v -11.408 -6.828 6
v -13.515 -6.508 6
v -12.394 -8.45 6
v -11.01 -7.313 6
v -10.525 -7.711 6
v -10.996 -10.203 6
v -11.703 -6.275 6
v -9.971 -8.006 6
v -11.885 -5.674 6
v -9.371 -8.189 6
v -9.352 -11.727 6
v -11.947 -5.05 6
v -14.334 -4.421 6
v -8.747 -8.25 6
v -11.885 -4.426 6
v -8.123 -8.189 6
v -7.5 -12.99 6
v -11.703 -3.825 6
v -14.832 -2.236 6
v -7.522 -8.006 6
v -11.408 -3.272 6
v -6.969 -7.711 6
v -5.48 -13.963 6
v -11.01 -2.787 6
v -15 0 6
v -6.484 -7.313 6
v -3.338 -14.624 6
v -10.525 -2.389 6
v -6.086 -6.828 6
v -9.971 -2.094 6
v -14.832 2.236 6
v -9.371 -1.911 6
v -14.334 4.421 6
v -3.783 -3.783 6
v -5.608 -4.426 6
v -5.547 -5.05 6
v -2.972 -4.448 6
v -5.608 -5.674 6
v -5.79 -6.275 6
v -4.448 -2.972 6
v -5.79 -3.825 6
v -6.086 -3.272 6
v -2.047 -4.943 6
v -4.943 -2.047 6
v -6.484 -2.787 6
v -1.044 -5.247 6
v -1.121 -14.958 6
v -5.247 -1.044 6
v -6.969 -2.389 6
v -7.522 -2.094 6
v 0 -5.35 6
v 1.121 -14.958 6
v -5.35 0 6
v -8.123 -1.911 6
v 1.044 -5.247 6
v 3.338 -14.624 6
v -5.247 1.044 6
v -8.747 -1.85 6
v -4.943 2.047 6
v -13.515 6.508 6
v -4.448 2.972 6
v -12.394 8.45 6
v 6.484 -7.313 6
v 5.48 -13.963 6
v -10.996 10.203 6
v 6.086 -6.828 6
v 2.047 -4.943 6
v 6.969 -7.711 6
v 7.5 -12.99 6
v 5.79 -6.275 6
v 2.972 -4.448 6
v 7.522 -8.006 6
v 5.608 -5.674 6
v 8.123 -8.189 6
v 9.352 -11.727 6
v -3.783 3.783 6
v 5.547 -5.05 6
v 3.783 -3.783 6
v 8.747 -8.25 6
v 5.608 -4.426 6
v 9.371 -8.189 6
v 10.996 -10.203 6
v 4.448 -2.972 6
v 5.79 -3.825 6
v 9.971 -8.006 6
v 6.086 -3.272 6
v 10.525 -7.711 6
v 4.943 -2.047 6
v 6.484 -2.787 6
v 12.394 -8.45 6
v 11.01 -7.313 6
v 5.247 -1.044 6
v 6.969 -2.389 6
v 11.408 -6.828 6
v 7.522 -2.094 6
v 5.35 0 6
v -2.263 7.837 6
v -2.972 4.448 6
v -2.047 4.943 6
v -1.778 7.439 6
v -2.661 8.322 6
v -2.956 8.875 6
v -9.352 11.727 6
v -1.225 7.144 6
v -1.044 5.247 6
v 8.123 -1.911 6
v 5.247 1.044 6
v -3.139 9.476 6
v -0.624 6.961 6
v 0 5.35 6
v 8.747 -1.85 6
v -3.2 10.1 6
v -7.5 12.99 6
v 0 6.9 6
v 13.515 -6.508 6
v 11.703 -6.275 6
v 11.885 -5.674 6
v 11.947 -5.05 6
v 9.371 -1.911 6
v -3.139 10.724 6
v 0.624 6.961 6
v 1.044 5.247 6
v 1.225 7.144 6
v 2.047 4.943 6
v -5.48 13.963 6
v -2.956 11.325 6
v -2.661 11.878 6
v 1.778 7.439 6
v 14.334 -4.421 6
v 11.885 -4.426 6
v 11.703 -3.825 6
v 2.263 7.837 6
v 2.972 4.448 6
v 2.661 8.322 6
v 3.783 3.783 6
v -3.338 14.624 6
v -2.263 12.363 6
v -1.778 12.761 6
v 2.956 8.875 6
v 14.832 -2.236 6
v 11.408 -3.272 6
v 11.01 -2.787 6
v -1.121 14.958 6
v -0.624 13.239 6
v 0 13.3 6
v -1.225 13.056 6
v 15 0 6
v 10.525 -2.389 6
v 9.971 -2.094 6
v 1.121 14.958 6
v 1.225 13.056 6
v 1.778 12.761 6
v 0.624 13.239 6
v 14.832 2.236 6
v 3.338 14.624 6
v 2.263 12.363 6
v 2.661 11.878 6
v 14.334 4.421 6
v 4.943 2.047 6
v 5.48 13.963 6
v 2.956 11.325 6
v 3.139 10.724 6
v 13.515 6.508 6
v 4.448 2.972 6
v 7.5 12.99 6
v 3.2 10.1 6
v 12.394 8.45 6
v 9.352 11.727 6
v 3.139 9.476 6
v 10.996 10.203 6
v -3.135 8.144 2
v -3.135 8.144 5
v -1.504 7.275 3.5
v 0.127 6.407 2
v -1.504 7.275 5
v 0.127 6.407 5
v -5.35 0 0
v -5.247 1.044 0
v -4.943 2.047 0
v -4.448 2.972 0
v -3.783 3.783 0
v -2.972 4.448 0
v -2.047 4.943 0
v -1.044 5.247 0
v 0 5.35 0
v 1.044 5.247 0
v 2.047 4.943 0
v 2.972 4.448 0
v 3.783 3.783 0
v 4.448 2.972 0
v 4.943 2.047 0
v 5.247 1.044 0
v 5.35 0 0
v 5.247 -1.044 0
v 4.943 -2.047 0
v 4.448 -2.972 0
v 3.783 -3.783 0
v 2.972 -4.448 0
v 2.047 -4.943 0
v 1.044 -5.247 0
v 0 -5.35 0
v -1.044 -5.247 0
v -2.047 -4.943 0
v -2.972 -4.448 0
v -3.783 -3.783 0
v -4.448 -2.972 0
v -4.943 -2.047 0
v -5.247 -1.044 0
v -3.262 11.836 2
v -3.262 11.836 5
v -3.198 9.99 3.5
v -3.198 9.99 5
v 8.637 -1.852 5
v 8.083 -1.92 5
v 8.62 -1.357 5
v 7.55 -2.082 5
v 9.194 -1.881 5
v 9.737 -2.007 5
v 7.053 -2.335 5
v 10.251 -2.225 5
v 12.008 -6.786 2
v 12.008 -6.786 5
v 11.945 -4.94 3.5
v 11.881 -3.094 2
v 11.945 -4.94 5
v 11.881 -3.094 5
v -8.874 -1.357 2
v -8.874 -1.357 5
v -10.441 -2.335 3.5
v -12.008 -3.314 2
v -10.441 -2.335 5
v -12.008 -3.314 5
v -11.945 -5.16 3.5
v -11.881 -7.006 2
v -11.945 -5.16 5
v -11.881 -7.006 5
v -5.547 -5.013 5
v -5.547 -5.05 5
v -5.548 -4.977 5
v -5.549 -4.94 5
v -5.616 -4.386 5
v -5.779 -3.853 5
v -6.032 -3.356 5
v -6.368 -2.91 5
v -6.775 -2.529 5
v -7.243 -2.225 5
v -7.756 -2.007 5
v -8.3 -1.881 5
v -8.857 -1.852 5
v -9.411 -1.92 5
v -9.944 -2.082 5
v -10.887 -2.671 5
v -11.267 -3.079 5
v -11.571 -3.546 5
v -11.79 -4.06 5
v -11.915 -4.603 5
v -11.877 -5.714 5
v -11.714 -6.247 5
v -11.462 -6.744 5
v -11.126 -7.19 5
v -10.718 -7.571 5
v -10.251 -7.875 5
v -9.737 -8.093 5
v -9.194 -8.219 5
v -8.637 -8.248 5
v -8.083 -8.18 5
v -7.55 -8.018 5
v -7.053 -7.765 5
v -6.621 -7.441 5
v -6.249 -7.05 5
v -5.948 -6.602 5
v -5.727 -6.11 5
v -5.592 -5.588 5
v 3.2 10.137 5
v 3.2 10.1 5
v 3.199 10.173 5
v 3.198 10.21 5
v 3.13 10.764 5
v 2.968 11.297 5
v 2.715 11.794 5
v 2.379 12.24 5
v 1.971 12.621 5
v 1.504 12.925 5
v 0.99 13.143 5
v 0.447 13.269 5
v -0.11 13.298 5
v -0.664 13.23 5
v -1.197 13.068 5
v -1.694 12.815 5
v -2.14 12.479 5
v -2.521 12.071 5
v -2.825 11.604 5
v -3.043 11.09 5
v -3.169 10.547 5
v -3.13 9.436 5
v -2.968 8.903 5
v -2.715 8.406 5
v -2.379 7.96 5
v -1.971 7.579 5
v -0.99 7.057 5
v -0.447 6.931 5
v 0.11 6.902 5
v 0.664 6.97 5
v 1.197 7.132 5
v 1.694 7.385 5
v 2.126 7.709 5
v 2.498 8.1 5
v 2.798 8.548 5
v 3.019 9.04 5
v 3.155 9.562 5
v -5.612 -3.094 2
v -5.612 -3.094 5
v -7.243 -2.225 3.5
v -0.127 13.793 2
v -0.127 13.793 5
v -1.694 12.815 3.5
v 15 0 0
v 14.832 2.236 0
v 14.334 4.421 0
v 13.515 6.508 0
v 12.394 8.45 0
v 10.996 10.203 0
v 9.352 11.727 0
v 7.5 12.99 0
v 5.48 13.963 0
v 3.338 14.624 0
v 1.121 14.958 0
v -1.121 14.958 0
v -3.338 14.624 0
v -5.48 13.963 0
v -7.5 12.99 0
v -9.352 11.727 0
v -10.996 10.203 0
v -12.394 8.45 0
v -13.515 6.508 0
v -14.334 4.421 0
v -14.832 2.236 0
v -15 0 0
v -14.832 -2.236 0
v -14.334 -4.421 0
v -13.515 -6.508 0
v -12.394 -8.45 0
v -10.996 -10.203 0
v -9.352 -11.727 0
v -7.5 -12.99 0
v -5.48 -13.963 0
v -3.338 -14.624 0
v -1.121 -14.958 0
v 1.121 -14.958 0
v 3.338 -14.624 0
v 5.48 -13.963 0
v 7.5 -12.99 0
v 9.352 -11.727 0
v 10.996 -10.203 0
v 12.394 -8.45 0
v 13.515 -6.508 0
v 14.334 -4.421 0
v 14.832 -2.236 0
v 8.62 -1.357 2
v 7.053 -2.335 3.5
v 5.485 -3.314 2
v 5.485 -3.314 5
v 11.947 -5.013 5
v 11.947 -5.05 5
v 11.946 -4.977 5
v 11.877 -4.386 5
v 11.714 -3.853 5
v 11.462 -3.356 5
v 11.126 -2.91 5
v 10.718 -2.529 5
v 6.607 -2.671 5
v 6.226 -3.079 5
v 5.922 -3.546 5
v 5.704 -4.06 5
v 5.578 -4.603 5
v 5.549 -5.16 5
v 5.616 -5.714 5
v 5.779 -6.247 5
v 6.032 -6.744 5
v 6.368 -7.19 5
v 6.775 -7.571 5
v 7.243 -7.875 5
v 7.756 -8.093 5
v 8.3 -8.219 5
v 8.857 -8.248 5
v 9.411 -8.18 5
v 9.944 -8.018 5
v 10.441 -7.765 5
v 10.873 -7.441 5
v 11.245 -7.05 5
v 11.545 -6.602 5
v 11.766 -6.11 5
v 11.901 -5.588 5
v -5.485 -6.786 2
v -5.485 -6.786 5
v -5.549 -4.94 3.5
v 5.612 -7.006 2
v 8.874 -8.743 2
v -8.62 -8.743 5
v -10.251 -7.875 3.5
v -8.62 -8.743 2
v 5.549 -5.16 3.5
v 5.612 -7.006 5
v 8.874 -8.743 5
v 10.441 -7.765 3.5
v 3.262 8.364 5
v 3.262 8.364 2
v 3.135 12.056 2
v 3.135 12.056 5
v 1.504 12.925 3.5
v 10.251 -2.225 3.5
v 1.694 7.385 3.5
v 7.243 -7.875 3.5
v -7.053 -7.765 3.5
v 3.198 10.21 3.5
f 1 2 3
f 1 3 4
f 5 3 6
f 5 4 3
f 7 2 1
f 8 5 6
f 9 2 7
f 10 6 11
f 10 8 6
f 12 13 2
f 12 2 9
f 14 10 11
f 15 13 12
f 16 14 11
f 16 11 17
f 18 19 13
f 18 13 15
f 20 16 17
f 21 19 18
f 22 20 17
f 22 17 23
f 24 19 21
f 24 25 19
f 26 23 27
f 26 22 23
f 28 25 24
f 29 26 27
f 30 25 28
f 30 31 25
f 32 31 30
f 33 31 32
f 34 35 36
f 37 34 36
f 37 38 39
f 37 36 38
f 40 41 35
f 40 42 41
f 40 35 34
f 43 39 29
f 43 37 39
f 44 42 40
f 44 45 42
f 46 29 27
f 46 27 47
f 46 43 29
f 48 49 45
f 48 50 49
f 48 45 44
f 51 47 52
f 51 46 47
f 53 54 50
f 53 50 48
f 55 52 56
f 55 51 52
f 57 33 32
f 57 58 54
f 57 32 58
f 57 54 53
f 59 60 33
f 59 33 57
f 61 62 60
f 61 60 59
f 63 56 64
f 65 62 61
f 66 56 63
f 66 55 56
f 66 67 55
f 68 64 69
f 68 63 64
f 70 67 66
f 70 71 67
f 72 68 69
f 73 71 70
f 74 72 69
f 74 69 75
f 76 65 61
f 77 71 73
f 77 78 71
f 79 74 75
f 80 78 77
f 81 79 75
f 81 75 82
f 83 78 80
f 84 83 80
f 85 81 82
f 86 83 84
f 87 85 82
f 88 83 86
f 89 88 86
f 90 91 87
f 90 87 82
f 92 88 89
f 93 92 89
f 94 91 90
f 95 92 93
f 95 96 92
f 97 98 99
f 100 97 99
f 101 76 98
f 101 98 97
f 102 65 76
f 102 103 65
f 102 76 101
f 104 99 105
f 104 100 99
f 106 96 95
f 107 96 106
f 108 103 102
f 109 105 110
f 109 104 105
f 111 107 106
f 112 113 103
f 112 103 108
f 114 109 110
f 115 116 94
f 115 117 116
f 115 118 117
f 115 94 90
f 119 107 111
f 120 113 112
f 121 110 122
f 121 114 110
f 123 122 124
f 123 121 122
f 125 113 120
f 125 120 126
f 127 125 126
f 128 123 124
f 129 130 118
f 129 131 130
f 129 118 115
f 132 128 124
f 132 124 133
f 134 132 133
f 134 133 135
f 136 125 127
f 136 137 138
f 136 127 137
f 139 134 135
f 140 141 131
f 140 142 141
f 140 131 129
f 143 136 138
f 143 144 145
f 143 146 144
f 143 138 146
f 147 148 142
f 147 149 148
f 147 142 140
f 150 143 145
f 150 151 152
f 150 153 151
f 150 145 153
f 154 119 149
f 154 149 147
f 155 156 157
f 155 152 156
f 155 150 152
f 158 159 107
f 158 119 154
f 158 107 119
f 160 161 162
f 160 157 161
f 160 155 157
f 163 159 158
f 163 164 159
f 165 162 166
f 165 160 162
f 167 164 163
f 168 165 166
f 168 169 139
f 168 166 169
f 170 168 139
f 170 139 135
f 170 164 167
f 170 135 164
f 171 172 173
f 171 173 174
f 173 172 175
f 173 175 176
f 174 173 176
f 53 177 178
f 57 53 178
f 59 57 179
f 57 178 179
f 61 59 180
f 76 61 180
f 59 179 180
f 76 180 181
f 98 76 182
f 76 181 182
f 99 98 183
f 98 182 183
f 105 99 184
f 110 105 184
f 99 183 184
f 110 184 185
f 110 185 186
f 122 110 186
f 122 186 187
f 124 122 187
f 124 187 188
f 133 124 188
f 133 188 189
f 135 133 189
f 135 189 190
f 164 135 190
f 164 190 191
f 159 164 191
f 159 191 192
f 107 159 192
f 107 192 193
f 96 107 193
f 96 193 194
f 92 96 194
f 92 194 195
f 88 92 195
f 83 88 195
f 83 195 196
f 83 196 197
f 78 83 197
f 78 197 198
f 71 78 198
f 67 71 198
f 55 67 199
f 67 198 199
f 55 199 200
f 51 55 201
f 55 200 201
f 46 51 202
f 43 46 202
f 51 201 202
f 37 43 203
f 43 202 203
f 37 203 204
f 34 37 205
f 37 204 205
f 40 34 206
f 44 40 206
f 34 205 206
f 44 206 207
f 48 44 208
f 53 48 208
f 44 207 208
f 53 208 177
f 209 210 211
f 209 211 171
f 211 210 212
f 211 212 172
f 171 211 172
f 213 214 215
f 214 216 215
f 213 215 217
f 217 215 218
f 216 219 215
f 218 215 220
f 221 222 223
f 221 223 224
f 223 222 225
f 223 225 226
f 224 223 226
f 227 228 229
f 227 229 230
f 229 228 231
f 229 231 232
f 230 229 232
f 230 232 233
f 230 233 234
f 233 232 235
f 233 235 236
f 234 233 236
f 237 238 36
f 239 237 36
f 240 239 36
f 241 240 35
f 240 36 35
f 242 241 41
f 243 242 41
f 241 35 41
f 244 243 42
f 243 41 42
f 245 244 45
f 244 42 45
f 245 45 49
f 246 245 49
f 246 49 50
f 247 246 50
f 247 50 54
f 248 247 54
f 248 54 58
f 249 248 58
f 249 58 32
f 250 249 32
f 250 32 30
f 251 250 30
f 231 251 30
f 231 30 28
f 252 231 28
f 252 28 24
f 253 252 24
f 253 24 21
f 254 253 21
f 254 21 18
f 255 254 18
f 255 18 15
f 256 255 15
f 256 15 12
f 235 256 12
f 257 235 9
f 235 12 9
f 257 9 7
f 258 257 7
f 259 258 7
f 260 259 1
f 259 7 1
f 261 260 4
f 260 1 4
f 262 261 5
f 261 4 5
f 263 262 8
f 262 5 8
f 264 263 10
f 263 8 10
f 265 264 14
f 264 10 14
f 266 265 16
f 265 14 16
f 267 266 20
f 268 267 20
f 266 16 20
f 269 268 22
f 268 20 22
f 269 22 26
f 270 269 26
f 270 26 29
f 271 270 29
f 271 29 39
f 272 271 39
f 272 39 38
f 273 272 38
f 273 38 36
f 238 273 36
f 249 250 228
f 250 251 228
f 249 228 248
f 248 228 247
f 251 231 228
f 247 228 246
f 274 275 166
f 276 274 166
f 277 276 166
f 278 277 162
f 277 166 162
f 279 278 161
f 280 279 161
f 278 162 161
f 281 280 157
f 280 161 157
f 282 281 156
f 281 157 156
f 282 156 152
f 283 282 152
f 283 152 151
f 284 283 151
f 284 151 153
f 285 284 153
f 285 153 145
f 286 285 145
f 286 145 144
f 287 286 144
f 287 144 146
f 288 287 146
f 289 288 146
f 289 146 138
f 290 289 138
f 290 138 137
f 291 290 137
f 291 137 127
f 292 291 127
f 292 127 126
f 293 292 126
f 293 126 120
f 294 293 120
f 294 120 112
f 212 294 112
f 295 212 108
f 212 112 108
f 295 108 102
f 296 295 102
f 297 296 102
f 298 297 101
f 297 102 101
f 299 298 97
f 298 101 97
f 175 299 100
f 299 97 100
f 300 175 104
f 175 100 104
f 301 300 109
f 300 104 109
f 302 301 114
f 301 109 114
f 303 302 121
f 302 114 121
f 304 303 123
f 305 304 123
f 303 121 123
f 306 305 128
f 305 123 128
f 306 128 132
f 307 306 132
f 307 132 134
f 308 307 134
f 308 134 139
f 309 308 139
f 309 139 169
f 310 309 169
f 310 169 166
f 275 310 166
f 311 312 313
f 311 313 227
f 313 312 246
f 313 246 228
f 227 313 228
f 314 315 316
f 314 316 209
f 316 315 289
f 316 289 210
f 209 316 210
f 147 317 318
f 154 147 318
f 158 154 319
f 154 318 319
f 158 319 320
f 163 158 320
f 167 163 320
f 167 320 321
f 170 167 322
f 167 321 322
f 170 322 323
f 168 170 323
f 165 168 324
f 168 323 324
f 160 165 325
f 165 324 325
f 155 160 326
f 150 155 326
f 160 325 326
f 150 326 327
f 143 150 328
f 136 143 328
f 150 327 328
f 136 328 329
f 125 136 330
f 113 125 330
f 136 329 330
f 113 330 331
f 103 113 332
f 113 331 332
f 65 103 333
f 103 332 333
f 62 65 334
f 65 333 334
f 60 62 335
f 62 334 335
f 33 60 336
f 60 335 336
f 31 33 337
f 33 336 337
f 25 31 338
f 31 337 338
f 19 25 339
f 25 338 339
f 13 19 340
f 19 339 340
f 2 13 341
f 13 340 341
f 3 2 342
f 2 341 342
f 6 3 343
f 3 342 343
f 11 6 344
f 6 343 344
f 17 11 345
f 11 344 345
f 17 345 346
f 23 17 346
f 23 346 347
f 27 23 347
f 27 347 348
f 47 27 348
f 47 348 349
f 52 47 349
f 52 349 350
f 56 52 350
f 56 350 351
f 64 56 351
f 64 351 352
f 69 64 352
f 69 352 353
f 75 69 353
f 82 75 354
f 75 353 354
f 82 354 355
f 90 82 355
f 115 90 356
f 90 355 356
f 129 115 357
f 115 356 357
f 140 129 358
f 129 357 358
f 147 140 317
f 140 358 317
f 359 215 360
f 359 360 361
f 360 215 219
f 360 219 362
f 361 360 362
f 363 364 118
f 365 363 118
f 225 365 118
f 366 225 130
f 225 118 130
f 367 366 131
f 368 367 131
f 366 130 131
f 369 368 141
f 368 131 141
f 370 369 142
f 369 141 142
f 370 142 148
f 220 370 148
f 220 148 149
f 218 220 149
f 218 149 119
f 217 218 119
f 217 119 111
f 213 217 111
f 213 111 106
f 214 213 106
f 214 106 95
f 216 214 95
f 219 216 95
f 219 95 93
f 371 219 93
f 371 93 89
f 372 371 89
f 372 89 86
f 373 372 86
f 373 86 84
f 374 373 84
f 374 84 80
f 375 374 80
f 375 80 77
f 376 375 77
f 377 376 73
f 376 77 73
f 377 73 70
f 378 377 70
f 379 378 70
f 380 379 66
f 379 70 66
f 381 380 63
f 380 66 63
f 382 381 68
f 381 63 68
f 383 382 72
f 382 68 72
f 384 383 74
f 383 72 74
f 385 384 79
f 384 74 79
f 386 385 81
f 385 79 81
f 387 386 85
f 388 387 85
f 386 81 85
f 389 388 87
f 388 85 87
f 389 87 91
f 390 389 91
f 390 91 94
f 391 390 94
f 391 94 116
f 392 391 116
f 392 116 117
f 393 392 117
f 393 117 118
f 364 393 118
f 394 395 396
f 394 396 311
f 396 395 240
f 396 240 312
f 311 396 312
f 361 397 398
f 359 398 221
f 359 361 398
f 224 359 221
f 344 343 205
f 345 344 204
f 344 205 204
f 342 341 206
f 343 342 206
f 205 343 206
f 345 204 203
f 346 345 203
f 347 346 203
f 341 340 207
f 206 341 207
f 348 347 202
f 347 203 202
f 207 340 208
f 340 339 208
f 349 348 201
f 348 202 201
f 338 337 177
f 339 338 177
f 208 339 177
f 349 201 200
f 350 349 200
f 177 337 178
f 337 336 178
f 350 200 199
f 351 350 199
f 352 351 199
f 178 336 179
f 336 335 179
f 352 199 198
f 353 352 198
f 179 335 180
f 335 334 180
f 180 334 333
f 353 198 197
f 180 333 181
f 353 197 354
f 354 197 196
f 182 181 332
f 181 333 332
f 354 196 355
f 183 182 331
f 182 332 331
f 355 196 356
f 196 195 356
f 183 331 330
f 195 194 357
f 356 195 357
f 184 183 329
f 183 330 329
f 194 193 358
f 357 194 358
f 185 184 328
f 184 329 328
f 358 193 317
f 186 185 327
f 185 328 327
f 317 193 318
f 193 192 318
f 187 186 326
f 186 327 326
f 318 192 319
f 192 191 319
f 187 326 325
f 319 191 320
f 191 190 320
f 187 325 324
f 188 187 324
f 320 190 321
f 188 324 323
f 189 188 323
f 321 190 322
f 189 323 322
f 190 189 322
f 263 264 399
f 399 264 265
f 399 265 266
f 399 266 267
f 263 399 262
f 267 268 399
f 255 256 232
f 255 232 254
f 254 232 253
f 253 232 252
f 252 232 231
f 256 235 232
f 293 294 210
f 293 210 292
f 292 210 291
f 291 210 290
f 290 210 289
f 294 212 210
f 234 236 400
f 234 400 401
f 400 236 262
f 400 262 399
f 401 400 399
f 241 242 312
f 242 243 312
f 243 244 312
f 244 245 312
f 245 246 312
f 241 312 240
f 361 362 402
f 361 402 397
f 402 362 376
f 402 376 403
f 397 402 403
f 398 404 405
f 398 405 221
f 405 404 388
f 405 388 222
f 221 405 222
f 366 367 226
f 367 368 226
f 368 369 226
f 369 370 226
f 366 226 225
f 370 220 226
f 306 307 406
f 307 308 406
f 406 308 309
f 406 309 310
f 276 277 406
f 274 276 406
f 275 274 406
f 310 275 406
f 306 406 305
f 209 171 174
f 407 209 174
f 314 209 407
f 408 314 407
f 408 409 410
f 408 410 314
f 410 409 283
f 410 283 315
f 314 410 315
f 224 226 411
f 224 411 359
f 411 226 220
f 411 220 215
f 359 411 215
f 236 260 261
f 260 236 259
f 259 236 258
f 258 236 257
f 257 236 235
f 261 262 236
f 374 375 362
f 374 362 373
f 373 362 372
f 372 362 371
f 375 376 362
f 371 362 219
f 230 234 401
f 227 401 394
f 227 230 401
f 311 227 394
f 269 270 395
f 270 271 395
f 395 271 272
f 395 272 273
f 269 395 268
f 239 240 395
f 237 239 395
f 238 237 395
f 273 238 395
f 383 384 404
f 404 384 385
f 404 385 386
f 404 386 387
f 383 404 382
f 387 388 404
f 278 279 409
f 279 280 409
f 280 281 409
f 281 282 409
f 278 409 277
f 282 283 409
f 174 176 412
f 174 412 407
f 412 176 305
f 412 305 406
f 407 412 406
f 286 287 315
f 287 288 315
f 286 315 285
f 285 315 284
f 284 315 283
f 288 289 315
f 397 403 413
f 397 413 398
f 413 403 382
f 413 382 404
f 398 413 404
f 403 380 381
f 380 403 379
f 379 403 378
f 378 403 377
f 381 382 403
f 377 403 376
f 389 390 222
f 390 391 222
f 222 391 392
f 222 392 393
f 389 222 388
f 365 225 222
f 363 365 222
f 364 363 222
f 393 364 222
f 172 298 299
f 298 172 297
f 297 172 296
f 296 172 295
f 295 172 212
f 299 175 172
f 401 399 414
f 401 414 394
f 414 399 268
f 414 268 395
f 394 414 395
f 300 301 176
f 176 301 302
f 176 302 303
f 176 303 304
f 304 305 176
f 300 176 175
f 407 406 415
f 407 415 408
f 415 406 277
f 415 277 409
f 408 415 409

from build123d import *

# Parameters (mm, degrees)
SKETCH1_R           = 15
BOSS_EXTRUDE1_DEPTH = 6
SKETCH5_R           = 5.35
CUT_EXTRUDE2_DEPTH  = 11.5
CUT_EXTRUDE3_START  = -1
CUT_EXTRUDE3_DEPTH  = 3
SKETCH7_R           = 3.2
CUT_EXTRUDE4_DEPTH  = 2.5


with BuildPart() as part:
    # Sketch1 → Boss-Extrude1 (new body)
    with BuildSketch(Plane(origin=(0, 0, 0), x_dir=(0, 1, 0), z_dir=(0, 0, 1))):
        with Locations(Location((0, 0, 0), (0, 0, 270))):
            Circle(SKETCH1_R)
    extrude(amount=BOSS_EXTRUDE1_DEPTH)

    # Sketch5 → Cut-Extrude2 (cut)
    with BuildSketch(Plane(origin=(0, 0, 0), x_dir=(1, 0, 0), z_dir=(0, 0, -1))):
        with Locations(Location((0, 0, 0), (0, 0, 180))):
            Circle(SKETCH5_R)
    extrude(amount=-CUT_EXTRUDE2_DEPTH, mode=Mode.SUBTRACT)

    # Sketch2 → Cut-Extrude3 (cut)
    with BuildSketch(Plane.XY.offset(6).offset(CUT_EXTRUDE3_START)):
        Polygon((8.873853267, -8.742858672), (12.008464346, -6.786446977), (11.881467657, -3.093588305), (8.619859889, -1.357141328), (5.485248811, -3.313553023), (5.6122455, -7.006411695), align=None)
        Polygon((3.134611078, 12.056411695), (-0.126996689, 13.792858672), (-3.261607767, 11.836446977), (-3.134611078, 8.143588305), (0.126996689, 6.407141328), (3.261607767, 8.363553023), align=None)
        Polygon((-12.008464346, -3.313553023), (-11.881467657, -7.006411695), (-8.619859889, -8.742858672), (-5.485248811, -6.786446977), (-5.6122455, -3.093588305), (-8.873853267, -1.357141328), align=None)
    extrude(amount=-CUT_EXTRUDE3_DEPTH, mode=Mode.SUBTRACT)

    # Sketch7 → Cut-Extrude4 (cut)
    with BuildSketch(Plane.XY.offset(6)):
        with Locations((8.746856578, -5.05)):
            Circle(SKETCH7_R)
        with Locations((0, 10.1)):
            Circle(SKETCH7_R)
        with Locations((-8.746856578, -5.05)):
            Circle(SKETCH7_R)
    extrude(amount=-CUT_EXTRUDE4_DEPTH, mode=Mode.SUBTRACT)


solid = part.part
